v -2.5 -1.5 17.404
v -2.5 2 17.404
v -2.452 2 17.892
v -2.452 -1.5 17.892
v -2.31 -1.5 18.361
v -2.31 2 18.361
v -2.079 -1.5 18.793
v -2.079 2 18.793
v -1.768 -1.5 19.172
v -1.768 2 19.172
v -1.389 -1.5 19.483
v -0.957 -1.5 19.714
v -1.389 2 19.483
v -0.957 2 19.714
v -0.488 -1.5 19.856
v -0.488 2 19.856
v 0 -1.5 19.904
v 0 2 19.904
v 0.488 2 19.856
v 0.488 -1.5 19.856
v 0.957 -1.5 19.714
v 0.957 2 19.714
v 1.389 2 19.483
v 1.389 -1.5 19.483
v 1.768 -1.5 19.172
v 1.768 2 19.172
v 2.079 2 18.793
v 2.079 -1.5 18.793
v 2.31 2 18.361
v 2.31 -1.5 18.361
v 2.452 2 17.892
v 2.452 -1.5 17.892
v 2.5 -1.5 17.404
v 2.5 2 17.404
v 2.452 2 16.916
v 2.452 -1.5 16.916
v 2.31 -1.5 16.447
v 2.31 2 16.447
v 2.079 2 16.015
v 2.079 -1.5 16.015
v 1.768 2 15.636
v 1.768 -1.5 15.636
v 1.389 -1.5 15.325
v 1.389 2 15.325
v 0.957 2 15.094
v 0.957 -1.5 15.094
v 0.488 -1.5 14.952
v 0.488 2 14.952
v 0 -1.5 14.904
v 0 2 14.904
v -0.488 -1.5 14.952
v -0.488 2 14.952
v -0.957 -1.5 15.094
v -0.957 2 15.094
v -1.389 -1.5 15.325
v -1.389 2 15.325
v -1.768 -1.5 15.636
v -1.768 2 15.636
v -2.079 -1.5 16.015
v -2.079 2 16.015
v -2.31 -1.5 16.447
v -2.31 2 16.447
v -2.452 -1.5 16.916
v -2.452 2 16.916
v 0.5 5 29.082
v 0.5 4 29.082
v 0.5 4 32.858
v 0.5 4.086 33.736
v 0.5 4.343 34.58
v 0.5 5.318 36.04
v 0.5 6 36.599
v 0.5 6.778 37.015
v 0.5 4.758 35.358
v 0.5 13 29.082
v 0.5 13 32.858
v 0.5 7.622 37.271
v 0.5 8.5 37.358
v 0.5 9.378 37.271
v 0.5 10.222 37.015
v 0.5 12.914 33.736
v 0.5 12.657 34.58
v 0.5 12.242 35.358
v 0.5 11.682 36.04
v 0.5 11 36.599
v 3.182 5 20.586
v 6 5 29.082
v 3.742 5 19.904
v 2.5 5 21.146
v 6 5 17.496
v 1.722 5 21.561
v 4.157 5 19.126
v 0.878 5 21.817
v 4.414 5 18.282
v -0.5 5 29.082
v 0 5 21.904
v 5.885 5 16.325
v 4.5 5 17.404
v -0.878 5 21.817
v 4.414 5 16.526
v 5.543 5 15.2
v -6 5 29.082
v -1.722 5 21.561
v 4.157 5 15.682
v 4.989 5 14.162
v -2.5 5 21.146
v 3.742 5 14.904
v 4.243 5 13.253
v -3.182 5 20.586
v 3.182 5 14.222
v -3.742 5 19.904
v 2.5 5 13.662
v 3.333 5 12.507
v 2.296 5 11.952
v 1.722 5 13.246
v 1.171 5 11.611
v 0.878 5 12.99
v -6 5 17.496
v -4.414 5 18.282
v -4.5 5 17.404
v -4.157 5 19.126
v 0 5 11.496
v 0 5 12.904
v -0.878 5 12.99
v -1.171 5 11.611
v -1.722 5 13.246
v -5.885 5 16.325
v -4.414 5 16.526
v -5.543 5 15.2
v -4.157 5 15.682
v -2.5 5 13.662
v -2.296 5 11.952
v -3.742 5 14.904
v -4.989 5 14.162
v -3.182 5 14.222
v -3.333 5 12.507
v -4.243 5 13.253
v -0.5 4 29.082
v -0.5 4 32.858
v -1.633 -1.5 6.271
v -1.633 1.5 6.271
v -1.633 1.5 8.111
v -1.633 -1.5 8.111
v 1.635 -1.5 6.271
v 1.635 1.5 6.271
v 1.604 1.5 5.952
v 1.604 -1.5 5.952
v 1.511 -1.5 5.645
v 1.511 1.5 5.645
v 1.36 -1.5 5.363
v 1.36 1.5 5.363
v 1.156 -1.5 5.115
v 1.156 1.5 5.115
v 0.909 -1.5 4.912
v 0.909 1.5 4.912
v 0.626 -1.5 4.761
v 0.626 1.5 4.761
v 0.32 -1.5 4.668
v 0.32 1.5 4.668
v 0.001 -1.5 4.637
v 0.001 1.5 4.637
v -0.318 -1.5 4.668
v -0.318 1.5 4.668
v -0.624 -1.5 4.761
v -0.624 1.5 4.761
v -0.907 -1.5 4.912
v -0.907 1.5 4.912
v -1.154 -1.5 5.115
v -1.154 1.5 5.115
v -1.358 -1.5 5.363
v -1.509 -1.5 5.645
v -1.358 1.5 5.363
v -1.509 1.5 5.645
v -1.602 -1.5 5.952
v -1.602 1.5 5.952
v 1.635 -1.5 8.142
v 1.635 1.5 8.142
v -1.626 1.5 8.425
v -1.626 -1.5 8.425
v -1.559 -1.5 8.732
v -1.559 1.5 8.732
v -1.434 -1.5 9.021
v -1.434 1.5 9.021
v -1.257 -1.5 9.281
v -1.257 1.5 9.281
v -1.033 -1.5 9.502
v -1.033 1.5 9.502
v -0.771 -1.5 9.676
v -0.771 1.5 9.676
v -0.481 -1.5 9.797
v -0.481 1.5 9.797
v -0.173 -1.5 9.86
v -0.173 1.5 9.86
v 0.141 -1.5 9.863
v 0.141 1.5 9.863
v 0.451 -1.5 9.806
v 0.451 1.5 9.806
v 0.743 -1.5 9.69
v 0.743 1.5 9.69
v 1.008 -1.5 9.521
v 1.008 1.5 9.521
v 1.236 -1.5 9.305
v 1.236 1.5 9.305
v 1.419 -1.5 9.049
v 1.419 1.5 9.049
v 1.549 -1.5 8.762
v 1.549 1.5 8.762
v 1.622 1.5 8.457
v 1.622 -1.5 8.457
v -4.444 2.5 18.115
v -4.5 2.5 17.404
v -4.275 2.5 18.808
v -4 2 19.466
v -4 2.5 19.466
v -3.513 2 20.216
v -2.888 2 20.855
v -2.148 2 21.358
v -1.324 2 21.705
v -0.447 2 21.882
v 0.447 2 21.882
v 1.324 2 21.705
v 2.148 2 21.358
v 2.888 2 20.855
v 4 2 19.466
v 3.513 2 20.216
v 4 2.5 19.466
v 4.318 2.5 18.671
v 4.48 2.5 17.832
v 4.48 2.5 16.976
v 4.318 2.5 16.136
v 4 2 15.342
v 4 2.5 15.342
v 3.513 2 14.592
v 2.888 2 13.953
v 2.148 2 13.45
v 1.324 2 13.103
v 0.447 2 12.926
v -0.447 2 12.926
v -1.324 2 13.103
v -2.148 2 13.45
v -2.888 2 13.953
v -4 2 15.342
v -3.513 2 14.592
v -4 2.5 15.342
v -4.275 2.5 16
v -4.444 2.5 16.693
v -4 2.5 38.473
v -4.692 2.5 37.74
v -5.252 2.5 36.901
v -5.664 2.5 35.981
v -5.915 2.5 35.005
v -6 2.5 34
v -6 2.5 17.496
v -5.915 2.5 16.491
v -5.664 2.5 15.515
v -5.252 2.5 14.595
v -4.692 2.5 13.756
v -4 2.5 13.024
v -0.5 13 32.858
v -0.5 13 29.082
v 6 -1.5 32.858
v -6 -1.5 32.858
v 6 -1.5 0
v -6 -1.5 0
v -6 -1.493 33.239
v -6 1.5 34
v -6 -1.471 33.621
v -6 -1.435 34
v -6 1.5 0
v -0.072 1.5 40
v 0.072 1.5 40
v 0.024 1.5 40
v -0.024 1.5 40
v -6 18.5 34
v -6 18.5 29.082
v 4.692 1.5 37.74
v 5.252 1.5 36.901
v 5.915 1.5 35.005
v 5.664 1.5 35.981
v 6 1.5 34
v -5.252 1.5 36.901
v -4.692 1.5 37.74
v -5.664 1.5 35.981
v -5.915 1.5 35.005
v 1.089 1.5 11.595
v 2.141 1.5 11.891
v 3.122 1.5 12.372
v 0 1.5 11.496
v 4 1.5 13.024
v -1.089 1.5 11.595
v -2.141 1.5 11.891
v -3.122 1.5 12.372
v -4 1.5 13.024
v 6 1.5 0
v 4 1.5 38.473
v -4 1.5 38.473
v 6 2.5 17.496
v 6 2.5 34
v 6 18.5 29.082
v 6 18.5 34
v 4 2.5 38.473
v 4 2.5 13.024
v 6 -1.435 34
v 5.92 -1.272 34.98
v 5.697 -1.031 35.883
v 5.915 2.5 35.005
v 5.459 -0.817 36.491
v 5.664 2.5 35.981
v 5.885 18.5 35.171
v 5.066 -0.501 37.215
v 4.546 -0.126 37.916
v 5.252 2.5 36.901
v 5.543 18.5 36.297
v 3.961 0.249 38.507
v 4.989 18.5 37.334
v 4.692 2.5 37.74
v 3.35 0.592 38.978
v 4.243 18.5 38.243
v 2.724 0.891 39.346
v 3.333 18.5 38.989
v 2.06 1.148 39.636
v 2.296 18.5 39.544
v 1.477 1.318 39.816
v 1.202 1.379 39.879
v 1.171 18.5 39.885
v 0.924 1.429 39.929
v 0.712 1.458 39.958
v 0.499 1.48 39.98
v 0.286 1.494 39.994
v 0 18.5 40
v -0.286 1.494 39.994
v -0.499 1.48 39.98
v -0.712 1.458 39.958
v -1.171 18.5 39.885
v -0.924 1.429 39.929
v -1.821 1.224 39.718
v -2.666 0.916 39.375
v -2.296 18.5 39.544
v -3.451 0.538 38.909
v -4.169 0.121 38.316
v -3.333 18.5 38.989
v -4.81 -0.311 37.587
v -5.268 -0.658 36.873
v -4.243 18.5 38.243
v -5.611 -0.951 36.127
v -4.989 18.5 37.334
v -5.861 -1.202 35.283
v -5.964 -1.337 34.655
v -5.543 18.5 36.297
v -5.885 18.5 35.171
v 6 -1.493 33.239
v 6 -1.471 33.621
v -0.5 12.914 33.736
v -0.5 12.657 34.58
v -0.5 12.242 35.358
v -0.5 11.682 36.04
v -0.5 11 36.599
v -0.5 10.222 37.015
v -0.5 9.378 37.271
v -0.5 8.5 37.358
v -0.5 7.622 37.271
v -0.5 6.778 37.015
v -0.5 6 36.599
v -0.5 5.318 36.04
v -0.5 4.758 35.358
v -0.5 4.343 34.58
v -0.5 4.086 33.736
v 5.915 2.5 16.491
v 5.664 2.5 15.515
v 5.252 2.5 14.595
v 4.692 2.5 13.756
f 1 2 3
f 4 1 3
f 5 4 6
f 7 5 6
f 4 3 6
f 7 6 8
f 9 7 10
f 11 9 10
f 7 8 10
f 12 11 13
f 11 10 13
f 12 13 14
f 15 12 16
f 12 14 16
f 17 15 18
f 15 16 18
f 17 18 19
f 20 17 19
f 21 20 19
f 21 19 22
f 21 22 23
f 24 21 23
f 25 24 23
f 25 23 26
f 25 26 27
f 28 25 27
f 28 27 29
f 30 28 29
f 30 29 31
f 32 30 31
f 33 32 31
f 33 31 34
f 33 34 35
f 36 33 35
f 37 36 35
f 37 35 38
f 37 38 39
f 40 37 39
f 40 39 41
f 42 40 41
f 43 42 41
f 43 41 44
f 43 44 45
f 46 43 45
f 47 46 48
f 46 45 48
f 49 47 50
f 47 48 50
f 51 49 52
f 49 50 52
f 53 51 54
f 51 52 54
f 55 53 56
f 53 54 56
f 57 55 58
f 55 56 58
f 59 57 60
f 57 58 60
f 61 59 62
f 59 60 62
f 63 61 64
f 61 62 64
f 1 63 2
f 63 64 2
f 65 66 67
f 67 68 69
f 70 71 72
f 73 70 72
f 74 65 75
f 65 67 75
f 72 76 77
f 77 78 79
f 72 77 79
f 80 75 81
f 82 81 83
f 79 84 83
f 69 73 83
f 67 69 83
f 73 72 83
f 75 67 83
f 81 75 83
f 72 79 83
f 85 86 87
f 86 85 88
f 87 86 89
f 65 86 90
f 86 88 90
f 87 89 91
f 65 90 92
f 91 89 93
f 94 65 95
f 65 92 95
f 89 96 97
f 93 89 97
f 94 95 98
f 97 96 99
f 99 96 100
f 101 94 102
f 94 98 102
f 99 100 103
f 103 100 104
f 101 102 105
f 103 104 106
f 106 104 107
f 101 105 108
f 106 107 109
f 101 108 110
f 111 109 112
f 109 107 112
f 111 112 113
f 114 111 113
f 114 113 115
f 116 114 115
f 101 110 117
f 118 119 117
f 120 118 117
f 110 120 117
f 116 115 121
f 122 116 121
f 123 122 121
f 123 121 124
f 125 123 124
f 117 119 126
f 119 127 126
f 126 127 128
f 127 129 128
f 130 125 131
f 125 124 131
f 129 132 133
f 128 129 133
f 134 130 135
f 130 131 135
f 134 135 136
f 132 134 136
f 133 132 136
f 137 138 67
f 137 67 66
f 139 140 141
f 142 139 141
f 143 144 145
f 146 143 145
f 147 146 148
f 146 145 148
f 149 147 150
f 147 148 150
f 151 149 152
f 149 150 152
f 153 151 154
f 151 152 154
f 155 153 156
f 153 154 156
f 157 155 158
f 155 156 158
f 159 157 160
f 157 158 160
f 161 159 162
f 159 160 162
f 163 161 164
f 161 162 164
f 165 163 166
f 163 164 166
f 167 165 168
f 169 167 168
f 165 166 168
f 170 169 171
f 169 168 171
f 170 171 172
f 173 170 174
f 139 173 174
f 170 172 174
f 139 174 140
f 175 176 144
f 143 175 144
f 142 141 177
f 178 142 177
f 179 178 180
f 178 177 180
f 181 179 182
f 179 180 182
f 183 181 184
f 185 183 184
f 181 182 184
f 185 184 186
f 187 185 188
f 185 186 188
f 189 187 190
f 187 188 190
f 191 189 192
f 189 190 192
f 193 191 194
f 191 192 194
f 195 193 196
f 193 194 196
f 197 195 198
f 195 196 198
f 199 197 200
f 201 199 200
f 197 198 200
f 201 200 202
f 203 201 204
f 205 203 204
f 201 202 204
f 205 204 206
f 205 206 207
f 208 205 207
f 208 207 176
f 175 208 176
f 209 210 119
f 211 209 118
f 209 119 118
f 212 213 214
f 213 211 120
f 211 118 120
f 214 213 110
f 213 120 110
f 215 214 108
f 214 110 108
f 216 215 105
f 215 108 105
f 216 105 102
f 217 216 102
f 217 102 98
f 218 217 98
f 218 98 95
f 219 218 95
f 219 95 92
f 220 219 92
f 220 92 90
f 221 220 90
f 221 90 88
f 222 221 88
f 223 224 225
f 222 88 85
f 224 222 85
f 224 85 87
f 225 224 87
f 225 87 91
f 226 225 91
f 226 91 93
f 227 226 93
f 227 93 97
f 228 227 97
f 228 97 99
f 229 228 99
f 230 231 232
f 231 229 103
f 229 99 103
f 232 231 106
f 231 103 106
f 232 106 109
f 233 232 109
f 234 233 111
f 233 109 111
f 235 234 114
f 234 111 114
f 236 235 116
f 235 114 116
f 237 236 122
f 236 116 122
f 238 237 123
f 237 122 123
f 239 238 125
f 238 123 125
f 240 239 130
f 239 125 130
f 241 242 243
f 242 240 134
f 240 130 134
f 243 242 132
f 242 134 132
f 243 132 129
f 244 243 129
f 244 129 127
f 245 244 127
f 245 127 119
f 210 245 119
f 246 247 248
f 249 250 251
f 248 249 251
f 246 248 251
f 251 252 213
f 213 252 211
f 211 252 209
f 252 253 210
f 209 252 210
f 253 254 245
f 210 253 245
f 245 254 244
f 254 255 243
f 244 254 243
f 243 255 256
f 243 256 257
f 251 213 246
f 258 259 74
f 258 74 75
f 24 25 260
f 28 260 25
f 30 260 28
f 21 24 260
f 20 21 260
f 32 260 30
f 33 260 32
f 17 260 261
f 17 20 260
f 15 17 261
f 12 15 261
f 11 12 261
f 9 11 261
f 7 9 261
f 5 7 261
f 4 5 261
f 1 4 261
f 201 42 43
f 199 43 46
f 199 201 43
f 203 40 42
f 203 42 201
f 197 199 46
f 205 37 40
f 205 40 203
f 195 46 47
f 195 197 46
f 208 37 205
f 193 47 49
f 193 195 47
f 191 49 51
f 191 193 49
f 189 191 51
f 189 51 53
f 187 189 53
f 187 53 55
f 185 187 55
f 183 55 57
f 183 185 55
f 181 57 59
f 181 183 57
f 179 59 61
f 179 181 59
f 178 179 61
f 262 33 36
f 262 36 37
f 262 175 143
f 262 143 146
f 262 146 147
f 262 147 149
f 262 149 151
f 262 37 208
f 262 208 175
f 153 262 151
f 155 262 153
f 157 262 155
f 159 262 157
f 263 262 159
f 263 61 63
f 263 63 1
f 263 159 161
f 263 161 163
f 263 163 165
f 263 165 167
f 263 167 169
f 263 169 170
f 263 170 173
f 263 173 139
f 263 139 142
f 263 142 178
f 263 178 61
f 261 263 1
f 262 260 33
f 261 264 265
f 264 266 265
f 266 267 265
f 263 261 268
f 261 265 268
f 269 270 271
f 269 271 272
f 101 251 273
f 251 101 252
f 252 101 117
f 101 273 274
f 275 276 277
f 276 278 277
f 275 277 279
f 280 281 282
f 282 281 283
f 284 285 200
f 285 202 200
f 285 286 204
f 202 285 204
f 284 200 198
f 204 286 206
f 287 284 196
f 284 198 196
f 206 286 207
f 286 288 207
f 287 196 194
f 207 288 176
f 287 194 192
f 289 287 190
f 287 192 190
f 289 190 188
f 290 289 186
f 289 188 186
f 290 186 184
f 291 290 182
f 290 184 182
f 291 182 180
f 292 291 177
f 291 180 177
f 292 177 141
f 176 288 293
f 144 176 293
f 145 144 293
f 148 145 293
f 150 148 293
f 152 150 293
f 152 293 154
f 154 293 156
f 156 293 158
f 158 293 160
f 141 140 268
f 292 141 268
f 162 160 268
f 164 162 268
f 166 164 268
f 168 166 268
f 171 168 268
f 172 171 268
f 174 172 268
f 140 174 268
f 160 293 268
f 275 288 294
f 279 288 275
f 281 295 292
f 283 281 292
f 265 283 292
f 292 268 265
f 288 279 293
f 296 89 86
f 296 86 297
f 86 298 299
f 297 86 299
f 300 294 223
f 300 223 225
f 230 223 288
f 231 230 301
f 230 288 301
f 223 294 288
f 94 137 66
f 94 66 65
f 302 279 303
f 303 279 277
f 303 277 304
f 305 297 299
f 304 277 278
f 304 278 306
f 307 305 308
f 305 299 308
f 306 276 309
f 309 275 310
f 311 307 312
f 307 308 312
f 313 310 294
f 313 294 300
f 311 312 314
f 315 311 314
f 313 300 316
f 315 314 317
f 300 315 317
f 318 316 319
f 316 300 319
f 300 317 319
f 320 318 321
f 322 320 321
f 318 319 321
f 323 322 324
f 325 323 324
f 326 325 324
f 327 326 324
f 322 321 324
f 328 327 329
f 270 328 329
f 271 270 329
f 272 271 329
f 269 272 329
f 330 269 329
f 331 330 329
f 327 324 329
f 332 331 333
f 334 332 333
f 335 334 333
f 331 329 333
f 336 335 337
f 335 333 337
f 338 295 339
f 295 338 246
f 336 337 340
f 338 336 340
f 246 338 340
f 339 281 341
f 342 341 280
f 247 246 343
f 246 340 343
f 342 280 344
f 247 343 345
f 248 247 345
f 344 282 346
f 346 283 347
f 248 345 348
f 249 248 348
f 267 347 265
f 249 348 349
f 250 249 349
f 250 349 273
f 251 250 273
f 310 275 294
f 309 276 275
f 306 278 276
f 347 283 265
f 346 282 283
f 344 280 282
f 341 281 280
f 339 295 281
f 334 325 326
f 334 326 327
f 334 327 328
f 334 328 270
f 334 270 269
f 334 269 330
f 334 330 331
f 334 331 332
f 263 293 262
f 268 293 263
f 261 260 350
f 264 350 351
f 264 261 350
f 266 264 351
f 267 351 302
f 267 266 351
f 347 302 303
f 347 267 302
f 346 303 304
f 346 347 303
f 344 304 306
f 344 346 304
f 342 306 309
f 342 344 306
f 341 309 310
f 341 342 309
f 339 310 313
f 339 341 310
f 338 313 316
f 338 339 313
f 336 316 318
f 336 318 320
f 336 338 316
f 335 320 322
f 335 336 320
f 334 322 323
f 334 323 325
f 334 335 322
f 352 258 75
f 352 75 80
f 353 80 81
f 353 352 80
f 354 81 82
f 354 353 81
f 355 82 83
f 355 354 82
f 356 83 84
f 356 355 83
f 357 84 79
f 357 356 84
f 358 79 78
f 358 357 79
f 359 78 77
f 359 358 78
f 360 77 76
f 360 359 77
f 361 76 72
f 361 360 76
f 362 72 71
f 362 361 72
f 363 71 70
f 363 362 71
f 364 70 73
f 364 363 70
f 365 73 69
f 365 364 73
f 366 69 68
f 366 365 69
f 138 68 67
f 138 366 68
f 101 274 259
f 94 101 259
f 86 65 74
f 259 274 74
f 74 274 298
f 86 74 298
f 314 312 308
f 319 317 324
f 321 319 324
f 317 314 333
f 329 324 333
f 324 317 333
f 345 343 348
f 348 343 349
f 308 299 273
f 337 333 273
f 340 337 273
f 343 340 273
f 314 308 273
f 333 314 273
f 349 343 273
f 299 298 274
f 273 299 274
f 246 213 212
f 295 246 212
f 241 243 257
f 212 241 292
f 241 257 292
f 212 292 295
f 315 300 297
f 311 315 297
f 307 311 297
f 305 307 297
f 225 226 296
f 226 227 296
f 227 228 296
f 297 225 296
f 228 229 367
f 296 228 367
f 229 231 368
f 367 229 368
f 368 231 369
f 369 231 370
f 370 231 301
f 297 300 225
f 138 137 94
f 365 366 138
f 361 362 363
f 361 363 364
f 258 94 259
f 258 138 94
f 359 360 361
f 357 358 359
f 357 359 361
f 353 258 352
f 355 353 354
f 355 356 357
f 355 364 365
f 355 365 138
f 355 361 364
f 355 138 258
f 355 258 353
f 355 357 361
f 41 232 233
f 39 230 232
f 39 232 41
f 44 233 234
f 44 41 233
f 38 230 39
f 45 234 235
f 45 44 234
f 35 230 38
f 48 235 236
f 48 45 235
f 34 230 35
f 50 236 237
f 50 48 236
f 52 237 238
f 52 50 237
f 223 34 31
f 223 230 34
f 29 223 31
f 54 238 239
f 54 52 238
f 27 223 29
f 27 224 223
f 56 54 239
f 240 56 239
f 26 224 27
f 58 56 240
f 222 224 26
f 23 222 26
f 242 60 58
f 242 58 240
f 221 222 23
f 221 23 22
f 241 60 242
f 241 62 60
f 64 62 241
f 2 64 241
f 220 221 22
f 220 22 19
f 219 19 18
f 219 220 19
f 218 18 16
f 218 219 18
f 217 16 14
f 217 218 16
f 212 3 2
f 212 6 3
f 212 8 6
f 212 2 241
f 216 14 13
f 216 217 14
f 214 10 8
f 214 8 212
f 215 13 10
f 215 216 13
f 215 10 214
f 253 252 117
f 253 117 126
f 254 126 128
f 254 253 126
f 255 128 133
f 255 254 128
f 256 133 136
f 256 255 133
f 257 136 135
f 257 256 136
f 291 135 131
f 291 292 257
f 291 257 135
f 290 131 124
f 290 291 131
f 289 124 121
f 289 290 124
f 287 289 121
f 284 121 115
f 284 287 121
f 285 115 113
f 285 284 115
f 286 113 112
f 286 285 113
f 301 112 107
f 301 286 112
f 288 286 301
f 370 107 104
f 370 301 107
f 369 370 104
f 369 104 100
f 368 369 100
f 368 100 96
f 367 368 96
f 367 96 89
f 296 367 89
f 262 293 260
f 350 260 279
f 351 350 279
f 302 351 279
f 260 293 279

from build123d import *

# Parameters (mm, degrees)
BOSS_EXTRUDE1_DEPTH = 40
CUT_EXTRUDE1_DEPTH  = 35
FILLET1_R           = 10
BOSS_EXTRUDE2_DEPTH = 3.5
CUT_EXTRUDE5_DEPTH  = 41.96687114982433
BOSS_EXTRUDE3_START = 13.5
BOSS_EXTRUDE3_DEPTH = 13.5
SKETCH10_R          = 2.4999999999999996
CUT_EXTRUDE6_DEPTH  = 13.5
SKETCH11_R          = 4.500000000000001
CUT_EXTRUDE7_DEPTH  = 3
SKETCH12_R          = 1.6339869281045687
CUT_EXTRUDE8_DEPTH  = 44.87521560524114
SHELL3_START        = -0.5
SHELL3_DEPTH        = 1
CUT_EXTRUDE9_DEPTH  = 45.47791075024091


# Read off the part's stored shape, not the designer's step: Shell3
with BuildPart() as part:
    # Sketch1 → Boss-Extrude1 (new body)
    with BuildSketch(Plane.XY):
        Polygon((6.0000000000003, 1.5000000000000038), (6.000000000000302, -1.5), (-6.0000000000000036, -1.5000000000000016), (-6.000000000000004, 1.4999999999999993), align=None)
    extrude(amount=BOSS_EXTRUDE1_DEPTH)

    # Sketch3 → Cut-Extrude1 (cut)
    with BuildSketch(Plane(origin=(6.000000000000301, 3.47e-15, 0), x_dir=(0, 0, -1), z_dir=(1, 5.8e-16, 0))):
        Polygon((-40, 1.5000000000000002), (-36.99999999999992, -1.5000000000000036), (-40, -1.5000000000000036), align=None)
    extrude(amount=-CUT_EXTRUDE1_DEPTH, mode=Mode.SUBTRACT)

    # Fillet1
    fillet1_edges = [part.edges().sort_by_distance(p)[0] for p in [
        (1.4921e-13, -1.5000000000000036, 36.99999999999992),
    ]]
    fillet(fillet1_edges, radius=FILLET1_R)

    # Sketch5 → Boss-Extrude2 (add)
    with BuildSketch(Plane(origin=(-5.4e-16, 1.5000000000000016, 0), x_dir=(1, 3.6e-16, 0), z_dir=(-3.6e-16, 1, 0))):
        with BuildLine():
            Line((6.000000000000301, -17.495666027521235), (6.000000000000301, -34.00043164524958))
            ThreePointArc((6.000000000000301, -34.00043164524958), (3.235e-14, -40.00043164524985), (-6.000000000000234, -34.00043164524958))
            Line((-6.000000000000234, -34.00043164524958), (-6.000000000000234, -17.495666027521235))
            ThreePointArc((-6.000000000000234, -17.495666027521235), (3.382e-14, -11.495666027520969), (6.000000000000301, -17.495666027521235))
        make_face()
    extrude(amount=BOSS_EXTRUDE2_DEPTH)

    # Sketch8 → Cut-Extrude5 (cut, through all)
    with BuildSketch(Plane(origin=(-1.81e-15, 5.000000000000002, 0), x_dir=(1, 3.6e-16, 0), z_dir=(-3.6e-16, 1, 0))):
        with BuildLine():
            Line((-6.000000000000004, -40), (-0.07196913699948215, -40))
            ThreePointArc((-0.07196913699948213, -40.00000000000001), (-4.268009771661707, -38.217550636812796), (-6.000000000000242, -34.00043164524961))
            Line((-6.0000000000002425, -34.00043164524961), (-6.000000000000004, -40))
        make_face()
        with BuildLine():
            ThreePointArc((6.000000000000299, -34.00043164524958), (4.268009771661984, -38.217550636812554), (0.07196913700016037, -40))
            Line((0.07196913700015983, -40), (6.000000000000301, -40))
            Line((6.000000000000301, -40), (6.000000000000301, -34.00043164524958))
        make_face()
    extrude(amount=-CUT_EXTRUDE5_DEPTH, mode=Mode.SUBTRACT)

    # Sketch9 → Boss-Extrude3 (add)
    with BuildSketch(Plane(origin=(-1.81e-15, 5.000000000000002, 0), x_dir=(1, 3.6e-16, 0), z_dir=(-3.6e-16, 1, 0)).offset(BOSS_EXTRUDE3_START)):
        with BuildLine():
            Line((-6.000000000000234, -29.081568785258), (6.000000000000301, -29.081568785258))
            Line((6.000000000000301, -29.081568785258), (6.000000000000301, -34.00043164524958))
            ThreePointArc((6.000000000000301, -34.00043164524958), (3.272e-14, -40.00043164524985), (-6.000000000000234, -34.00043164524958))
            Line((-6.000000000000234, -34.00043164524958), (-6.000000000000234, -29.081568785258))
        make_face()
    extrude(amount=-BOSS_EXTRUDE3_DEPTH)

    # Sketch10 → Cut-Extrude6 (cut)
    with BuildSketch(Plane(origin=(-1.81e-15, 5.000000000000002, 0), x_dir=(1, 3.6e-16, 0), z_dir=(-3.6e-16, 1, 0))):
        with Locations(Location((1e-17, -17.403956104439153, 0), (0, 0, 180))):
            Circle(SKETCH10_R)
    extrude(amount=-CUT_EXTRUDE6_DEPTH, mode=Mode.SUBTRACT)

    # Sketch11 → Cut-Extrude7 (cut)
    with BuildSketch(Plane(origin=(-1.81e-15, 5.000000000000002, 0), x_dir=(1, 3.6e-16, 0), z_dir=(-3.6e-16, 1, 0))):
        with Locations(Location((1e-17, -17.403956104439153, 0), (0, 0, 180))):
            Circle(SKETCH11_R)
    extrude(amount=-CUT_EXTRUDE7_DEPTH, mode=Mode.SUBTRACT)

    # Sketch12 → Cut-Extrude8 (cut, through all)
    with BuildSketch(Plane(origin=(-5.4e-16, 1.5000000000000016, 0), x_dir=(1, 3.6e-16, 0), z_dir=(-3.6e-16, 1, 0))):
        with Locations((1e-17, -17.403956104439153)):
            Circle(SKETCH12_R)
        with BuildLine():
            Line((1.6350000000000315, -8.142419448359679), (1.6350000000000313, -6.270656428732565))
            ThreePointArc((1.6350000000000313, -6.270656428732565), (0.00101307189543799, -4.636669500627991), (-1.6329738562091354, -6.270656428732585))
            Line((-1.6329738562091354, -6.270656428732585), (-1.6329738562091352, -8.110833214748085))
            ThreePointArc((-1.6329738562091352, -8.110833214748085), (-0.01582557591703412, -9.86878595405819), (1.6350000000000315, -8.142419448359679))
        make_face()
    extrude(amount=-CUT_EXTRUDE8_DEPTH, mode=Mode.SUBTRACT)

    # Shell3 outline → Shell3 (cut)
    with BuildSketch(Plane.YZ.offset(SHELL3_START)):
        with BuildLine():
            Line((4, 29.081568785), (13, 29.081568785))
            Line((13, 29.081568785), (13, 32.857864376))
            ThreePointArc((13, 32.857864376), (8.5, 37.357864376), (4, 32.857864376))
            Line((4, 32.857864376), (4, 29.081568785))
        make_face()
    extrude(amount=SHELL3_DEPTH, mode=Mode.SUBTRACT)

    # Sketch18 → Cut-Extrude9 (cut, through all)
    with BuildSketch(Plane(origin=(0, 0, 0), x_dir=(-1, 0, 0), z_dir=(0, 0, -1))):
        Polygon((6.000000000000441, 1.5), (6.000000000000442, -1.499999999999904), (-5.999999999999879, -1.4999999999999782), (-5.999999999999879, 1.5000000000000229), (-4.000000000000168, 1.5000000000001654), (-4.000000000000022, 2.5000000000001656), (-7.000000000000024, 2.500000000000053), (-7.000000000000022, -2.499999999999947), (7, -2.4999999999998628), (6.999999999999999, 2.500000000000055), (4.000000000000475, 2.5000000000000546), (4.000000000000459, 1.5), align=None)
    extrude(amount=-CUT_EXTRUDE9_DEPTH, mode=Mode.SUBTRACT)


solid = part.part
